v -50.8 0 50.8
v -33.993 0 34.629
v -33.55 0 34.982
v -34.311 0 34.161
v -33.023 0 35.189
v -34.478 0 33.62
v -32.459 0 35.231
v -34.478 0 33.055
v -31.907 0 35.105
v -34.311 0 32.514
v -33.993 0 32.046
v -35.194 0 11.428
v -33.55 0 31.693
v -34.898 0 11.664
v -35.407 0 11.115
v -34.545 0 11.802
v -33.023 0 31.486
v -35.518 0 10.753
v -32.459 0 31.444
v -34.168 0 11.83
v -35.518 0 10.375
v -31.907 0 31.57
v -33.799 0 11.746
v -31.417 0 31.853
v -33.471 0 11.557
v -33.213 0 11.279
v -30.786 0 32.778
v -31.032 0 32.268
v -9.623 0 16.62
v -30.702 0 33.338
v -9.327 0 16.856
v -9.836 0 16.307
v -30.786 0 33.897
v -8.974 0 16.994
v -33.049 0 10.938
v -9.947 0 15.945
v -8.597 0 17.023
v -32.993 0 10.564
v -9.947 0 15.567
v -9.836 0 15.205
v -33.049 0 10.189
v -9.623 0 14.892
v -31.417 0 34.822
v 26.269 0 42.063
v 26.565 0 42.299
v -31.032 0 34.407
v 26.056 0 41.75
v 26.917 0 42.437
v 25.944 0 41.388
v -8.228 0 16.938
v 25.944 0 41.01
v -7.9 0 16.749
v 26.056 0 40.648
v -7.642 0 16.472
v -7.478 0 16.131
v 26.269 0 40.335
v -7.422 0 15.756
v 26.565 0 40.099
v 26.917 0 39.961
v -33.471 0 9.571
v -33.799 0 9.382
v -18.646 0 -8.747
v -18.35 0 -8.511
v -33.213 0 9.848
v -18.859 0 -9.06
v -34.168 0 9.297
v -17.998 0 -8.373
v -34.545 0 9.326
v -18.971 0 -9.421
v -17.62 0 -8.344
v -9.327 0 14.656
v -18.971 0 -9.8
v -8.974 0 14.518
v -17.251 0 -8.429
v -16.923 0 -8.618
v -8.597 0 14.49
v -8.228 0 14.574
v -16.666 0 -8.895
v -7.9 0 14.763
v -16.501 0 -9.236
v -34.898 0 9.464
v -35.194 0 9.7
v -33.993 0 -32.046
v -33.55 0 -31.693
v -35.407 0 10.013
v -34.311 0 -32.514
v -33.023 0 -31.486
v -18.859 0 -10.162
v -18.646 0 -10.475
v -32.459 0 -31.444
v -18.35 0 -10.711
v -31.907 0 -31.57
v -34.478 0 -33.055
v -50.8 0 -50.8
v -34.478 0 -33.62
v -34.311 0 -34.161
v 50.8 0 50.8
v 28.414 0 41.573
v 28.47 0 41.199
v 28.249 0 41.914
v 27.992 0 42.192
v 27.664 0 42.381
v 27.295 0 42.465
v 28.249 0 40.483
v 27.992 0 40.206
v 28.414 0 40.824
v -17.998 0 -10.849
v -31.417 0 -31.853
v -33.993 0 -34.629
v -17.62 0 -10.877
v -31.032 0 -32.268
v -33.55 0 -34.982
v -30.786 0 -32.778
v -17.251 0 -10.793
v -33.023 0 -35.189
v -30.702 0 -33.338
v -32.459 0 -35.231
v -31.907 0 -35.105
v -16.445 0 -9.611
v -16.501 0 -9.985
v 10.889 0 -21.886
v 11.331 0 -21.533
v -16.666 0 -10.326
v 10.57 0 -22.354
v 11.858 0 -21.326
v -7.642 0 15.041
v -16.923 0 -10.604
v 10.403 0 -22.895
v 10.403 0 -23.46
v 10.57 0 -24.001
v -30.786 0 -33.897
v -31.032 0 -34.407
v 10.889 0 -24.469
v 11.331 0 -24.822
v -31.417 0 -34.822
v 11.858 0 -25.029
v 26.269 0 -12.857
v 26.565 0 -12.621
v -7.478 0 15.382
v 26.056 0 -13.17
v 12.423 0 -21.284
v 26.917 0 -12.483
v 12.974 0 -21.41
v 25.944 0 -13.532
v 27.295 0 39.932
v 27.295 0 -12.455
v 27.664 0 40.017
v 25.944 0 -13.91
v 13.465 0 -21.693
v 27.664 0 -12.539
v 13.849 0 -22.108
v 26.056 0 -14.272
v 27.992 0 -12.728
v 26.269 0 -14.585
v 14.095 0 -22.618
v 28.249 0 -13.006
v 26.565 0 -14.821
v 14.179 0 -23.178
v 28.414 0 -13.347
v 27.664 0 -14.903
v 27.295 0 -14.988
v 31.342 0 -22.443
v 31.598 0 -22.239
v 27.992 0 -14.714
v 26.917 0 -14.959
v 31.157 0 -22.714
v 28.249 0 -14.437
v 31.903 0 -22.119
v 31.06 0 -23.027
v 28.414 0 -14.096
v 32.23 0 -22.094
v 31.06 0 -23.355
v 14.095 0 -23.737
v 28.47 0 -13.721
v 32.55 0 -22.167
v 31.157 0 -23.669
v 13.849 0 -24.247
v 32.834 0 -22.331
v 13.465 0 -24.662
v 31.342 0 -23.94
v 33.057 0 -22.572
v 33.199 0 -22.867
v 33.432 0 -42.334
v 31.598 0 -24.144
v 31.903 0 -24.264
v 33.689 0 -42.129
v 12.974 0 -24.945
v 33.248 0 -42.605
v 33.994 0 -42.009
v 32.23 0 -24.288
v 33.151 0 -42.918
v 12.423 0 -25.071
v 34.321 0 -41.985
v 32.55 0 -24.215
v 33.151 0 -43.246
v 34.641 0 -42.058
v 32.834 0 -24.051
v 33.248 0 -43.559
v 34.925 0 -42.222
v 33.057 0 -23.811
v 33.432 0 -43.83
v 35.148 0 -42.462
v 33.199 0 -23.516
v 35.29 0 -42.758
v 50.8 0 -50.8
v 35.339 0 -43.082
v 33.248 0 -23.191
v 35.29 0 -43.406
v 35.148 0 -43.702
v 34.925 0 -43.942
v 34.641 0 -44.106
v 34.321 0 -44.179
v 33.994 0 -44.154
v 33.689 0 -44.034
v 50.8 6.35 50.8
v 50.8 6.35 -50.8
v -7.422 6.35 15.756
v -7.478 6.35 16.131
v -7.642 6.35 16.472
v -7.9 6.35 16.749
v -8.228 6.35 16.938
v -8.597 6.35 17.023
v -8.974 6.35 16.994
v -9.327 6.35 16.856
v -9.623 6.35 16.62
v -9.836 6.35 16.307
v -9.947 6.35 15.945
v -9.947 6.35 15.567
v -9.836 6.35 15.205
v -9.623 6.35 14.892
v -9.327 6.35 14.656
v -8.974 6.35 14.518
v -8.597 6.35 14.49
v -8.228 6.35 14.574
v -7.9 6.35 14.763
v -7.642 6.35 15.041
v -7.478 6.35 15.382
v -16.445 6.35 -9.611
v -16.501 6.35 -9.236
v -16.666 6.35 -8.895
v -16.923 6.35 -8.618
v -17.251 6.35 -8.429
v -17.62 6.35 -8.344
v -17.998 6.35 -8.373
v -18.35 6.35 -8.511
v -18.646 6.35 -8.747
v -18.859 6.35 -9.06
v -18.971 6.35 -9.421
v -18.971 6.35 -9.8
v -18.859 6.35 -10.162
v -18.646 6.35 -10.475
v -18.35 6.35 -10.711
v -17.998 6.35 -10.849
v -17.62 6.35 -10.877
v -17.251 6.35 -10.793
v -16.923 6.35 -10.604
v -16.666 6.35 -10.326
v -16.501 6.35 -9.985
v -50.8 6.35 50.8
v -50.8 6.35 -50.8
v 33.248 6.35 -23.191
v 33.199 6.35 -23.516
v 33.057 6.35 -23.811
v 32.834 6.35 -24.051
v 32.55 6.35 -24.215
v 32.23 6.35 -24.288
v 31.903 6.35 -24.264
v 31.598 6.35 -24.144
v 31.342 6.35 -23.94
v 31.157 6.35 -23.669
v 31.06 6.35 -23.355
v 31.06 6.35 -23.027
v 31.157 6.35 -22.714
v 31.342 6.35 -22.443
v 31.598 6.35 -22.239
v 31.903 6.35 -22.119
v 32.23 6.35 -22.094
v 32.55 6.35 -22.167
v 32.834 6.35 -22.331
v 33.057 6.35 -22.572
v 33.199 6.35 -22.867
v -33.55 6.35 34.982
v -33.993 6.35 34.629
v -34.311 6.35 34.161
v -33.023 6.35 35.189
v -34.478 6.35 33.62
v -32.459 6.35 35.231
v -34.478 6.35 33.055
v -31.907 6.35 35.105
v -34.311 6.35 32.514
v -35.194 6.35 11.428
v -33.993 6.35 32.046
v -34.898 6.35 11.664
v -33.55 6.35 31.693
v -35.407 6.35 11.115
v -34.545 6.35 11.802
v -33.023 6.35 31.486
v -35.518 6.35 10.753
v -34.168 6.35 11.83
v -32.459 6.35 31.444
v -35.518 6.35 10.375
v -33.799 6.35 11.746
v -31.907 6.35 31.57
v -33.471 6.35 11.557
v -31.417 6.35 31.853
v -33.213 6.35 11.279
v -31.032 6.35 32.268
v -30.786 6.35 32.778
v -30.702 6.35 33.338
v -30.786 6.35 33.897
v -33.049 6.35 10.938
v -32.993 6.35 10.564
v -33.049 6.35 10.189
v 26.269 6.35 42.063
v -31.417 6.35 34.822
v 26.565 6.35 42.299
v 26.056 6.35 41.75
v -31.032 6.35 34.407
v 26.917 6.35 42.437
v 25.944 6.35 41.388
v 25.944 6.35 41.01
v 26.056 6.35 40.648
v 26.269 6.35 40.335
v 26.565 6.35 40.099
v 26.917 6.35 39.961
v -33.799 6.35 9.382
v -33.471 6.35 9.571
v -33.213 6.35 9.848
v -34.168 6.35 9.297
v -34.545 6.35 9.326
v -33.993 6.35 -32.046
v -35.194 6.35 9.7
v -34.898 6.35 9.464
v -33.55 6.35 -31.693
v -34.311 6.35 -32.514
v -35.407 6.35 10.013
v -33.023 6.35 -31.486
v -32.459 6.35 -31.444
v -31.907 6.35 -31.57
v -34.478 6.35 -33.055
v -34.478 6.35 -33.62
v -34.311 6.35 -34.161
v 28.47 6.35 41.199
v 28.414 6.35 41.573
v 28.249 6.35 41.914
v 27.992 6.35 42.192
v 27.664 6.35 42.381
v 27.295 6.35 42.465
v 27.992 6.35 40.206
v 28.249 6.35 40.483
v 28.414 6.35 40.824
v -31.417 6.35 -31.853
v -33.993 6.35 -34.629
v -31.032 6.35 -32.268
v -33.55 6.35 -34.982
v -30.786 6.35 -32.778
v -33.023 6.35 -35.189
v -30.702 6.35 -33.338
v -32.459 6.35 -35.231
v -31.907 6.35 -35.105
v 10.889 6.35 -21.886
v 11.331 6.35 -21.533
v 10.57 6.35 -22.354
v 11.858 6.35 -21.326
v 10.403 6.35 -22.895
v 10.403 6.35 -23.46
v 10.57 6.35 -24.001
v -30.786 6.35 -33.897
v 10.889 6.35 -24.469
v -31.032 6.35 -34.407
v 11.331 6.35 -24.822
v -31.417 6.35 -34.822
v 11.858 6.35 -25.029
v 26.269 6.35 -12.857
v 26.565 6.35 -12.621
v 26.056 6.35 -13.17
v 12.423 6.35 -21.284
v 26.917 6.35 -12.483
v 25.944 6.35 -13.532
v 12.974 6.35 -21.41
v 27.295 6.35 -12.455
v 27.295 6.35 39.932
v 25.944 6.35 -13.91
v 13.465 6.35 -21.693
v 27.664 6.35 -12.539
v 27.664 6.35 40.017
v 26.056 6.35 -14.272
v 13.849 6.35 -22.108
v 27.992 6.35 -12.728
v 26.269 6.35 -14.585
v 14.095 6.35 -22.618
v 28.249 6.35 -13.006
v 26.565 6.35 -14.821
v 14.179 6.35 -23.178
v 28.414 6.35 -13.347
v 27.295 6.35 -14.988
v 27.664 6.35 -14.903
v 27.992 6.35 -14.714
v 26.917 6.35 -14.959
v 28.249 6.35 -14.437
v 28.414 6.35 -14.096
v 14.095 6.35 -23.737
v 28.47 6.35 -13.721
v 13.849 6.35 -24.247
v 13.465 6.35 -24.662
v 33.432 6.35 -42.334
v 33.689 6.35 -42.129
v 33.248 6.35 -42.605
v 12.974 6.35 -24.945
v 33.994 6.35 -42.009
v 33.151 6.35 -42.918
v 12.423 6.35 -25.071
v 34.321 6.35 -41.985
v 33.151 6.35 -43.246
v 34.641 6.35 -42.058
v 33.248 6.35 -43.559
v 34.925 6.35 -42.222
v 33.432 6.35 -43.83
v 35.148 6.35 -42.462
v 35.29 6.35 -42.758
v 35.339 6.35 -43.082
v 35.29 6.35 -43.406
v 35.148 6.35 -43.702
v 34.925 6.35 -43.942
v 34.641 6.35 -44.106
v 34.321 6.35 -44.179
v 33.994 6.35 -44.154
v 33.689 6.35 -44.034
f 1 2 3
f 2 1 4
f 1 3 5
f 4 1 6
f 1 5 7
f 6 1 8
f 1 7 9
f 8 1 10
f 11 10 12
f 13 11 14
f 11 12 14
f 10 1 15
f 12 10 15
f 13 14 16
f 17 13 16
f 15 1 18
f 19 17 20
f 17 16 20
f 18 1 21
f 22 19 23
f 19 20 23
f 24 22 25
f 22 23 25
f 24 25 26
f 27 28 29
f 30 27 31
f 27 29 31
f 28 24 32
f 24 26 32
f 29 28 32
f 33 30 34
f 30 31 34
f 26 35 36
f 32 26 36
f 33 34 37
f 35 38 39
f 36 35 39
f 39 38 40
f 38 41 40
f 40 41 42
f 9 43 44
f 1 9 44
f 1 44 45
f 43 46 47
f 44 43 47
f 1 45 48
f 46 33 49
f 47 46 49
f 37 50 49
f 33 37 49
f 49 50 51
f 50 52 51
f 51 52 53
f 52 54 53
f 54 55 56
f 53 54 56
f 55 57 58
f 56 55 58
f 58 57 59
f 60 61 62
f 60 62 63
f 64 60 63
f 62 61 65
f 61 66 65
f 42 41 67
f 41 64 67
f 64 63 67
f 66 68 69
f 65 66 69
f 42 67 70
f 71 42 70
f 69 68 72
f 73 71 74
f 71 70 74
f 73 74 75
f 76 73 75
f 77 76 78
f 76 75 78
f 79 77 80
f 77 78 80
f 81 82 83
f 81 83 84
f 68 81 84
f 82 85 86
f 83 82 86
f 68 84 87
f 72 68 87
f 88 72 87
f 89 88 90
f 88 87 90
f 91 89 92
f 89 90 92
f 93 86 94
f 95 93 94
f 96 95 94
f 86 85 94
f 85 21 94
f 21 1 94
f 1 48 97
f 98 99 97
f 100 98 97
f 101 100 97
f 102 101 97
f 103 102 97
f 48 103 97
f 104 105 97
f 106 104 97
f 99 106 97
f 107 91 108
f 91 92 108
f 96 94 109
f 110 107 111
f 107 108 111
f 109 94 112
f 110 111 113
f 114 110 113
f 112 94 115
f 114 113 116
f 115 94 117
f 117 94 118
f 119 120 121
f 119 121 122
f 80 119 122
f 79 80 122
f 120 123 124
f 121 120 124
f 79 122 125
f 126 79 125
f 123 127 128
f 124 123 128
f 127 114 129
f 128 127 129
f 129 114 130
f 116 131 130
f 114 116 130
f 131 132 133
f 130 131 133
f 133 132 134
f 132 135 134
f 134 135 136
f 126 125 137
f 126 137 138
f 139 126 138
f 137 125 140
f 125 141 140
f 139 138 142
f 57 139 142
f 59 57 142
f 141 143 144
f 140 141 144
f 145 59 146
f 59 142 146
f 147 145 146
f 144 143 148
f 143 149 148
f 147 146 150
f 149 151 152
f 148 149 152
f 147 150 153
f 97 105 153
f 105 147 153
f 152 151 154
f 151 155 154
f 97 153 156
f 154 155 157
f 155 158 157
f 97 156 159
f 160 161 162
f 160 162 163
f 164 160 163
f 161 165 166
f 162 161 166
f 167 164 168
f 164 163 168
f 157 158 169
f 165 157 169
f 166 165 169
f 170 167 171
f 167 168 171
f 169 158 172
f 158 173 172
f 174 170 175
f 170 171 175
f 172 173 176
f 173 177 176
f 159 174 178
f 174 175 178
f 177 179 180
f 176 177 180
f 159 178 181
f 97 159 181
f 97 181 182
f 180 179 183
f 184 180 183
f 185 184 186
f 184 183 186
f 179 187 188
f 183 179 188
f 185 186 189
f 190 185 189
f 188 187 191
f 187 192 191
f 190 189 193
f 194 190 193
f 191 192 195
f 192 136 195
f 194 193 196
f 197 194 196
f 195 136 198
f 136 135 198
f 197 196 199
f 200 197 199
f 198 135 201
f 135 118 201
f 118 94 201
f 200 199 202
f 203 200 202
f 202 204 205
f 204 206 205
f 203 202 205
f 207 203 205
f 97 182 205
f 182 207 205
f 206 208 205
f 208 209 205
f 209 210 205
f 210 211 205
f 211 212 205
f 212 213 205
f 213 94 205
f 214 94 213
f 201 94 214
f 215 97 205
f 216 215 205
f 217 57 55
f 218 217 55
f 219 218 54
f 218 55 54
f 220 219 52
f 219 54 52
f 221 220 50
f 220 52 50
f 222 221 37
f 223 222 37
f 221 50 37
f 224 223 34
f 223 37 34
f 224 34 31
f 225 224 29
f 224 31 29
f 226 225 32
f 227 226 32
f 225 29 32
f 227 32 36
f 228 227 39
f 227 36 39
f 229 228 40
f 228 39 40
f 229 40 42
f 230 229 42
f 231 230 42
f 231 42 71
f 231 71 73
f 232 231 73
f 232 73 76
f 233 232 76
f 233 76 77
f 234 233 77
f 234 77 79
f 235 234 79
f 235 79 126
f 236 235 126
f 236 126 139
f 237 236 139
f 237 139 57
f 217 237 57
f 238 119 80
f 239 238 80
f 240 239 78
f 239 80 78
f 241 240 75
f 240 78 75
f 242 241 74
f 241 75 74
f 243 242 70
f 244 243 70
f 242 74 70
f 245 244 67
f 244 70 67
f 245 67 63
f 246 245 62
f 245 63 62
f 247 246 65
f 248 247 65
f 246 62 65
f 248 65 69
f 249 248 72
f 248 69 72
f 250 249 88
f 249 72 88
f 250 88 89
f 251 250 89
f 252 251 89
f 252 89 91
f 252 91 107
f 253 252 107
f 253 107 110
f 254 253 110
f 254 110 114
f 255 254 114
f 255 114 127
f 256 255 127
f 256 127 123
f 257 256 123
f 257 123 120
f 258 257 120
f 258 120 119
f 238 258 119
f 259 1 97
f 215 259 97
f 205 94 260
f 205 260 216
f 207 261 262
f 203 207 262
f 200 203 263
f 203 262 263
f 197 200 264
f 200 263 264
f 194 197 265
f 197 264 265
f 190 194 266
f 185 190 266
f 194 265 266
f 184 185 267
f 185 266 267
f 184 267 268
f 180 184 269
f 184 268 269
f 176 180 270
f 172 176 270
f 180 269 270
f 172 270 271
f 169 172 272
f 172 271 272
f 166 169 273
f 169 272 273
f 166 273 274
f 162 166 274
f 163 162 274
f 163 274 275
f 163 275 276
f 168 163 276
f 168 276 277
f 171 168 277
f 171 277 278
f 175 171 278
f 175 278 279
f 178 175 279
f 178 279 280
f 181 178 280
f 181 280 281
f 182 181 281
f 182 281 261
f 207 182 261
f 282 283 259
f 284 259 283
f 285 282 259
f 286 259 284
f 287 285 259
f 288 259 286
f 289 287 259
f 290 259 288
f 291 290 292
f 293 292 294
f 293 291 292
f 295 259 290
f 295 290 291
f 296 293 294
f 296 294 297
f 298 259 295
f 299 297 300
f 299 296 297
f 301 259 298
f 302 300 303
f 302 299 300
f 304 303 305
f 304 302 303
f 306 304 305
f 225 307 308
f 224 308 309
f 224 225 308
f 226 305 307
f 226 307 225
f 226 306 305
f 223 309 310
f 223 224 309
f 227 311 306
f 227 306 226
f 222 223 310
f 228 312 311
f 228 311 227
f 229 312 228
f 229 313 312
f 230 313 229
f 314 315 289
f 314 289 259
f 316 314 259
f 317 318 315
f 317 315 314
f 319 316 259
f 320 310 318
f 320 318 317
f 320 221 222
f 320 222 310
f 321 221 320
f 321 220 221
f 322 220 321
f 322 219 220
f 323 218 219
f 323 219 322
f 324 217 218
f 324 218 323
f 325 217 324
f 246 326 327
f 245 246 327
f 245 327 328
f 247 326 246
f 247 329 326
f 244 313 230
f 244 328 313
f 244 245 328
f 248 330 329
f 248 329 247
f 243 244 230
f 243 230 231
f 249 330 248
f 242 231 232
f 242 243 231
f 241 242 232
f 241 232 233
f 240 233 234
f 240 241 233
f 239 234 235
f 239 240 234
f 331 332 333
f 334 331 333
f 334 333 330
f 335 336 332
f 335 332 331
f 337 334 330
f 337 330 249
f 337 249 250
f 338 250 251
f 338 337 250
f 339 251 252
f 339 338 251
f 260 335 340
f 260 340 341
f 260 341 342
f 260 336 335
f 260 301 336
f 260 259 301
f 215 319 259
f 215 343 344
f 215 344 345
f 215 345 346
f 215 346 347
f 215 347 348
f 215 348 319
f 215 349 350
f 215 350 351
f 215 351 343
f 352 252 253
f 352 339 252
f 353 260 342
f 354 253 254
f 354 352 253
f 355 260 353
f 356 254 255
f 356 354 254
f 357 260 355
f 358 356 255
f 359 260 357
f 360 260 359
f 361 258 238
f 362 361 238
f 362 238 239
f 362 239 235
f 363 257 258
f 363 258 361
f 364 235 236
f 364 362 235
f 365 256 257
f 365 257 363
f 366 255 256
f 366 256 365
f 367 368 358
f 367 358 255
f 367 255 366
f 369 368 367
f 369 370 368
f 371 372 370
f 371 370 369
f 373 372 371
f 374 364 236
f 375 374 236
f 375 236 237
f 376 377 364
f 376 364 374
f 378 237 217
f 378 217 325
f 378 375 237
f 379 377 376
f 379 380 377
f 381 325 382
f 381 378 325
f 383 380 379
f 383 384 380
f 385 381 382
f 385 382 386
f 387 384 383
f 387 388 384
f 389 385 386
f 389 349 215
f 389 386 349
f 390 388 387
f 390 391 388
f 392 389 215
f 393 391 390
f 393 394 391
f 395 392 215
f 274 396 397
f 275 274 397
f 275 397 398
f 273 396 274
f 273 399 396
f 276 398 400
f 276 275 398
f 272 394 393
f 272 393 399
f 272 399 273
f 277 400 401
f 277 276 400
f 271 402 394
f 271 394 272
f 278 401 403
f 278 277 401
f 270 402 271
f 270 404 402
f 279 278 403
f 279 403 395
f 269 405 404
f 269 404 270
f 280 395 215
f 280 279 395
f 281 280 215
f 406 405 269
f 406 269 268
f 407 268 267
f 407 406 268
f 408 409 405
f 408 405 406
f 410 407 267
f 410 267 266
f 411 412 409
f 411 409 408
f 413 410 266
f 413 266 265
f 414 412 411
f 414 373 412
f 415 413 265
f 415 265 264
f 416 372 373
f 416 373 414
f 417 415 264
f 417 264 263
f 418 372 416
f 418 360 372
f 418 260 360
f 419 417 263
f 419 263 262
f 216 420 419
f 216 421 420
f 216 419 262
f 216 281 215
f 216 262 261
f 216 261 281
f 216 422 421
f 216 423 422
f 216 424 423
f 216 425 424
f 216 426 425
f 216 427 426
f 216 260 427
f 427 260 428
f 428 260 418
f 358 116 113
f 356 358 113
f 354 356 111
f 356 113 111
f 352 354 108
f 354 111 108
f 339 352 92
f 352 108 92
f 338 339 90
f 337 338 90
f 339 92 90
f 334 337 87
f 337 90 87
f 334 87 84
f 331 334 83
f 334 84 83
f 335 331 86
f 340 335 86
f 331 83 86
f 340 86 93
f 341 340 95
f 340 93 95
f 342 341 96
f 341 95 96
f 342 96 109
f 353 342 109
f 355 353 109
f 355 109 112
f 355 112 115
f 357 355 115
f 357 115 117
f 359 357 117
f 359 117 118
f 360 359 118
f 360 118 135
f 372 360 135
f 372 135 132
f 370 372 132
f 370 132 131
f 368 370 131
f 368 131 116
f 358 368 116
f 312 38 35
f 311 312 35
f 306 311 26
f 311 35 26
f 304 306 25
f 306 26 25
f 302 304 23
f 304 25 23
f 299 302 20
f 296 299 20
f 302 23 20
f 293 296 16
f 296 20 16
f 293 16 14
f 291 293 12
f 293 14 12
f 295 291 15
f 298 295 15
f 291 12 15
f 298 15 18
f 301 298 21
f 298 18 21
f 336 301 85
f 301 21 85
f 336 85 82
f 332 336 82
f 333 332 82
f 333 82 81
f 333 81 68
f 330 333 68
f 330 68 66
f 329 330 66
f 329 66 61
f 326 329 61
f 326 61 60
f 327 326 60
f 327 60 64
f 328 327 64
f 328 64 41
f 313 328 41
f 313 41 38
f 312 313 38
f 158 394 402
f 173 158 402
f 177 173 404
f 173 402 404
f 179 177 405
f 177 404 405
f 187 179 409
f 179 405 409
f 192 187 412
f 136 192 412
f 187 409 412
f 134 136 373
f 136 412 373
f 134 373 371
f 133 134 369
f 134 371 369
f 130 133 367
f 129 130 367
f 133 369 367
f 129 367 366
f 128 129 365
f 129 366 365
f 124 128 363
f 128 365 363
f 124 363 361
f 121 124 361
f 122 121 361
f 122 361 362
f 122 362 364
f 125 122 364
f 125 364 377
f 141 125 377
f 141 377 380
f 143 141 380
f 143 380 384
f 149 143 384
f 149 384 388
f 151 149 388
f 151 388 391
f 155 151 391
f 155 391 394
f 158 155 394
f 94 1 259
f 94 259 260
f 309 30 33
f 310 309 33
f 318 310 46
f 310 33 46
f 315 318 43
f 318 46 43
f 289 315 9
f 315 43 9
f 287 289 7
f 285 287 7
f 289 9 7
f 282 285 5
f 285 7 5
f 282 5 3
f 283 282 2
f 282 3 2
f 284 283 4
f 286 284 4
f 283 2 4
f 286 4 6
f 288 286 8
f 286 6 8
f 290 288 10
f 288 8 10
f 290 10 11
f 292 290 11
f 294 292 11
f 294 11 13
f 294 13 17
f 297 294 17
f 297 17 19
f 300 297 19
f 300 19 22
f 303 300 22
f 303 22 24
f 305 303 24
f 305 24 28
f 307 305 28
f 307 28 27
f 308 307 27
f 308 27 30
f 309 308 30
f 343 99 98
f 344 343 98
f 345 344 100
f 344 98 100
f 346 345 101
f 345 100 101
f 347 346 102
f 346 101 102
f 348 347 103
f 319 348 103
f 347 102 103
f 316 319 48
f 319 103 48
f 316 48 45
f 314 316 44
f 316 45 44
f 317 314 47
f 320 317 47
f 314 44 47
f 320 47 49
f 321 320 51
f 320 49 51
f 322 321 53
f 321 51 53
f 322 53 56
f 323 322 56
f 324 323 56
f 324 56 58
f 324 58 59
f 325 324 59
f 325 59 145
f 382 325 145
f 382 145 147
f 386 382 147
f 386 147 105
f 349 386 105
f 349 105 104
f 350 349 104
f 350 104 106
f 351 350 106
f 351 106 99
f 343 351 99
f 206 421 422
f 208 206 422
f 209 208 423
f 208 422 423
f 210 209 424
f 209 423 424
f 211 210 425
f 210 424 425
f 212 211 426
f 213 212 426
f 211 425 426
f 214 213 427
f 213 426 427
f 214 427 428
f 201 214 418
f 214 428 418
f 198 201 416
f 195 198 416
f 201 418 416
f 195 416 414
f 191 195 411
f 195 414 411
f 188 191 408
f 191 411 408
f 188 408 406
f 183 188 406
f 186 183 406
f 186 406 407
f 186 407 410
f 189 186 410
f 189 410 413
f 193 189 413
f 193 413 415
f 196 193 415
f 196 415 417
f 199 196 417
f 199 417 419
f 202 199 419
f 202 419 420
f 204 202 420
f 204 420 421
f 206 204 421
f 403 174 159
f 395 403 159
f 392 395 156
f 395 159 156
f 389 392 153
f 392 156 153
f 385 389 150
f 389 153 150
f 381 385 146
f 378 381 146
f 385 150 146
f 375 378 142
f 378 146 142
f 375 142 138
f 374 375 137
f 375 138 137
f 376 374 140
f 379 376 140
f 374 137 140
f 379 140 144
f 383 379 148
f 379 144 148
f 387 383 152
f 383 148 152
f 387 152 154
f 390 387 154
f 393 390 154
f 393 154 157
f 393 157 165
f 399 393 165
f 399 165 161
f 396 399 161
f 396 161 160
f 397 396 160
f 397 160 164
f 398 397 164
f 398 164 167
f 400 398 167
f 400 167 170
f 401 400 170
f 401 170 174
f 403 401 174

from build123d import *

# Parameters (mm, degrees)
SKETCH1_W           = 101.6
SKETCH1_H           = 101.6
BOSS_EXTRUDE1_DEPTH = 6.35
SKETCH3_R           = 1.27
CUT_EXTRUDE2_DEPTH  = 7.35
SKETCH4_R           = 1.27
CUT_EXTRUDE3_DEPTH  = 7.35
SKETCH7_R           = 1.89865
CUT_EXTRUDE5_DEPTH  = 7.35
SKETCH8_R           = 1.89865
CUT_EXTRUDE6_DEPTH  = 7.35
SKETCH10_R          = 1.1
CUT_EXTRUDE7_DEPTH  = 7.35


with BuildPart() as part:
    # Sketch1 → Boss-Extrude1 (new body)
    with BuildSketch(Plane(origin=(0, 0, 0), x_dir=(1, 0, 0), z_dir=(0, 1, 0))):
        Rectangle(SKETCH1_W, SKETCH1_H)
    extrude(amount=BOSS_EXTRUDE1_DEPTH)

    # Sketch3 → Cut-Extrude2 (cut, through all)
    with BuildSketch(Plane.XZ):
        with Locations((-8.691546024, 15.75616758)):
            Circle(SKETCH3_R)
        with Locations((-34.262562923, 10.563822948)):
            Circle(SKETCH3_R)
        with Locations((-17.714931052, -9.610745883)):
            Circle(SKETCH3_R)
    extrude(amount=-CUT_EXTRUDE2_DEPTH, mode=Mode.SUBTRACT)

    # Sketch4 → Cut-Extrude3 (cut, through all)
    with BuildSketch(Plane.XZ):
        with Locations((27.2, 41.198822948)):
            Circle(SKETCH4_R)
        with Locations((27.2, -13.721177052)):
            Circle(SKETCH4_R)
    extrude(amount=-CUT_EXTRUDE3_DEPTH, mode=Mode.SUBTRACT)

    # Sketch7 → Cut-Extrude5 (cut, through all)
    with BuildSketch(Plane.XZ):
        with Locations((-32.600738686, -33.3375)):
            Circle(SKETCH7_R)
        with Locations((-32.600738686, 33.3375)):
            Circle(SKETCH7_R)
    extrude(amount=-CUT_EXTRUDE5_DEPTH, mode=Mode.SUBTRACT)

    # Sketch8 → Cut-Extrude6 (cut, through all)
    with BuildSketch(Plane(origin=(0, 6.35, 0), x_dir=(1, 0, 0), z_dir=(0, 1, 0))):
        with Locations((12.280738686, 23.1775)):
            Circle(SKETCH8_R)
    extrude(amount=-CUT_EXTRUDE6_DEPTH, mode=Mode.SUBTRACT)

    # Sketch10 → Cut-Extrude7 (cut, through all)
    with BuildSketch(Plane(origin=(0, 6.35, 0), x_dir=(1, 0, 0), z_dir=(0, 1, 0))):
        with Locations((34.238748138, 43.081855351)):
            Circle(SKETCH10_R)
        with Locations((32.148178872, 23.191417444)):
            Circle(SKETCH10_R)
    extrude(amount=-CUT_EXTRUDE7_DEPTH, mode=Mode.SUBTRACT)


solid = part.part
